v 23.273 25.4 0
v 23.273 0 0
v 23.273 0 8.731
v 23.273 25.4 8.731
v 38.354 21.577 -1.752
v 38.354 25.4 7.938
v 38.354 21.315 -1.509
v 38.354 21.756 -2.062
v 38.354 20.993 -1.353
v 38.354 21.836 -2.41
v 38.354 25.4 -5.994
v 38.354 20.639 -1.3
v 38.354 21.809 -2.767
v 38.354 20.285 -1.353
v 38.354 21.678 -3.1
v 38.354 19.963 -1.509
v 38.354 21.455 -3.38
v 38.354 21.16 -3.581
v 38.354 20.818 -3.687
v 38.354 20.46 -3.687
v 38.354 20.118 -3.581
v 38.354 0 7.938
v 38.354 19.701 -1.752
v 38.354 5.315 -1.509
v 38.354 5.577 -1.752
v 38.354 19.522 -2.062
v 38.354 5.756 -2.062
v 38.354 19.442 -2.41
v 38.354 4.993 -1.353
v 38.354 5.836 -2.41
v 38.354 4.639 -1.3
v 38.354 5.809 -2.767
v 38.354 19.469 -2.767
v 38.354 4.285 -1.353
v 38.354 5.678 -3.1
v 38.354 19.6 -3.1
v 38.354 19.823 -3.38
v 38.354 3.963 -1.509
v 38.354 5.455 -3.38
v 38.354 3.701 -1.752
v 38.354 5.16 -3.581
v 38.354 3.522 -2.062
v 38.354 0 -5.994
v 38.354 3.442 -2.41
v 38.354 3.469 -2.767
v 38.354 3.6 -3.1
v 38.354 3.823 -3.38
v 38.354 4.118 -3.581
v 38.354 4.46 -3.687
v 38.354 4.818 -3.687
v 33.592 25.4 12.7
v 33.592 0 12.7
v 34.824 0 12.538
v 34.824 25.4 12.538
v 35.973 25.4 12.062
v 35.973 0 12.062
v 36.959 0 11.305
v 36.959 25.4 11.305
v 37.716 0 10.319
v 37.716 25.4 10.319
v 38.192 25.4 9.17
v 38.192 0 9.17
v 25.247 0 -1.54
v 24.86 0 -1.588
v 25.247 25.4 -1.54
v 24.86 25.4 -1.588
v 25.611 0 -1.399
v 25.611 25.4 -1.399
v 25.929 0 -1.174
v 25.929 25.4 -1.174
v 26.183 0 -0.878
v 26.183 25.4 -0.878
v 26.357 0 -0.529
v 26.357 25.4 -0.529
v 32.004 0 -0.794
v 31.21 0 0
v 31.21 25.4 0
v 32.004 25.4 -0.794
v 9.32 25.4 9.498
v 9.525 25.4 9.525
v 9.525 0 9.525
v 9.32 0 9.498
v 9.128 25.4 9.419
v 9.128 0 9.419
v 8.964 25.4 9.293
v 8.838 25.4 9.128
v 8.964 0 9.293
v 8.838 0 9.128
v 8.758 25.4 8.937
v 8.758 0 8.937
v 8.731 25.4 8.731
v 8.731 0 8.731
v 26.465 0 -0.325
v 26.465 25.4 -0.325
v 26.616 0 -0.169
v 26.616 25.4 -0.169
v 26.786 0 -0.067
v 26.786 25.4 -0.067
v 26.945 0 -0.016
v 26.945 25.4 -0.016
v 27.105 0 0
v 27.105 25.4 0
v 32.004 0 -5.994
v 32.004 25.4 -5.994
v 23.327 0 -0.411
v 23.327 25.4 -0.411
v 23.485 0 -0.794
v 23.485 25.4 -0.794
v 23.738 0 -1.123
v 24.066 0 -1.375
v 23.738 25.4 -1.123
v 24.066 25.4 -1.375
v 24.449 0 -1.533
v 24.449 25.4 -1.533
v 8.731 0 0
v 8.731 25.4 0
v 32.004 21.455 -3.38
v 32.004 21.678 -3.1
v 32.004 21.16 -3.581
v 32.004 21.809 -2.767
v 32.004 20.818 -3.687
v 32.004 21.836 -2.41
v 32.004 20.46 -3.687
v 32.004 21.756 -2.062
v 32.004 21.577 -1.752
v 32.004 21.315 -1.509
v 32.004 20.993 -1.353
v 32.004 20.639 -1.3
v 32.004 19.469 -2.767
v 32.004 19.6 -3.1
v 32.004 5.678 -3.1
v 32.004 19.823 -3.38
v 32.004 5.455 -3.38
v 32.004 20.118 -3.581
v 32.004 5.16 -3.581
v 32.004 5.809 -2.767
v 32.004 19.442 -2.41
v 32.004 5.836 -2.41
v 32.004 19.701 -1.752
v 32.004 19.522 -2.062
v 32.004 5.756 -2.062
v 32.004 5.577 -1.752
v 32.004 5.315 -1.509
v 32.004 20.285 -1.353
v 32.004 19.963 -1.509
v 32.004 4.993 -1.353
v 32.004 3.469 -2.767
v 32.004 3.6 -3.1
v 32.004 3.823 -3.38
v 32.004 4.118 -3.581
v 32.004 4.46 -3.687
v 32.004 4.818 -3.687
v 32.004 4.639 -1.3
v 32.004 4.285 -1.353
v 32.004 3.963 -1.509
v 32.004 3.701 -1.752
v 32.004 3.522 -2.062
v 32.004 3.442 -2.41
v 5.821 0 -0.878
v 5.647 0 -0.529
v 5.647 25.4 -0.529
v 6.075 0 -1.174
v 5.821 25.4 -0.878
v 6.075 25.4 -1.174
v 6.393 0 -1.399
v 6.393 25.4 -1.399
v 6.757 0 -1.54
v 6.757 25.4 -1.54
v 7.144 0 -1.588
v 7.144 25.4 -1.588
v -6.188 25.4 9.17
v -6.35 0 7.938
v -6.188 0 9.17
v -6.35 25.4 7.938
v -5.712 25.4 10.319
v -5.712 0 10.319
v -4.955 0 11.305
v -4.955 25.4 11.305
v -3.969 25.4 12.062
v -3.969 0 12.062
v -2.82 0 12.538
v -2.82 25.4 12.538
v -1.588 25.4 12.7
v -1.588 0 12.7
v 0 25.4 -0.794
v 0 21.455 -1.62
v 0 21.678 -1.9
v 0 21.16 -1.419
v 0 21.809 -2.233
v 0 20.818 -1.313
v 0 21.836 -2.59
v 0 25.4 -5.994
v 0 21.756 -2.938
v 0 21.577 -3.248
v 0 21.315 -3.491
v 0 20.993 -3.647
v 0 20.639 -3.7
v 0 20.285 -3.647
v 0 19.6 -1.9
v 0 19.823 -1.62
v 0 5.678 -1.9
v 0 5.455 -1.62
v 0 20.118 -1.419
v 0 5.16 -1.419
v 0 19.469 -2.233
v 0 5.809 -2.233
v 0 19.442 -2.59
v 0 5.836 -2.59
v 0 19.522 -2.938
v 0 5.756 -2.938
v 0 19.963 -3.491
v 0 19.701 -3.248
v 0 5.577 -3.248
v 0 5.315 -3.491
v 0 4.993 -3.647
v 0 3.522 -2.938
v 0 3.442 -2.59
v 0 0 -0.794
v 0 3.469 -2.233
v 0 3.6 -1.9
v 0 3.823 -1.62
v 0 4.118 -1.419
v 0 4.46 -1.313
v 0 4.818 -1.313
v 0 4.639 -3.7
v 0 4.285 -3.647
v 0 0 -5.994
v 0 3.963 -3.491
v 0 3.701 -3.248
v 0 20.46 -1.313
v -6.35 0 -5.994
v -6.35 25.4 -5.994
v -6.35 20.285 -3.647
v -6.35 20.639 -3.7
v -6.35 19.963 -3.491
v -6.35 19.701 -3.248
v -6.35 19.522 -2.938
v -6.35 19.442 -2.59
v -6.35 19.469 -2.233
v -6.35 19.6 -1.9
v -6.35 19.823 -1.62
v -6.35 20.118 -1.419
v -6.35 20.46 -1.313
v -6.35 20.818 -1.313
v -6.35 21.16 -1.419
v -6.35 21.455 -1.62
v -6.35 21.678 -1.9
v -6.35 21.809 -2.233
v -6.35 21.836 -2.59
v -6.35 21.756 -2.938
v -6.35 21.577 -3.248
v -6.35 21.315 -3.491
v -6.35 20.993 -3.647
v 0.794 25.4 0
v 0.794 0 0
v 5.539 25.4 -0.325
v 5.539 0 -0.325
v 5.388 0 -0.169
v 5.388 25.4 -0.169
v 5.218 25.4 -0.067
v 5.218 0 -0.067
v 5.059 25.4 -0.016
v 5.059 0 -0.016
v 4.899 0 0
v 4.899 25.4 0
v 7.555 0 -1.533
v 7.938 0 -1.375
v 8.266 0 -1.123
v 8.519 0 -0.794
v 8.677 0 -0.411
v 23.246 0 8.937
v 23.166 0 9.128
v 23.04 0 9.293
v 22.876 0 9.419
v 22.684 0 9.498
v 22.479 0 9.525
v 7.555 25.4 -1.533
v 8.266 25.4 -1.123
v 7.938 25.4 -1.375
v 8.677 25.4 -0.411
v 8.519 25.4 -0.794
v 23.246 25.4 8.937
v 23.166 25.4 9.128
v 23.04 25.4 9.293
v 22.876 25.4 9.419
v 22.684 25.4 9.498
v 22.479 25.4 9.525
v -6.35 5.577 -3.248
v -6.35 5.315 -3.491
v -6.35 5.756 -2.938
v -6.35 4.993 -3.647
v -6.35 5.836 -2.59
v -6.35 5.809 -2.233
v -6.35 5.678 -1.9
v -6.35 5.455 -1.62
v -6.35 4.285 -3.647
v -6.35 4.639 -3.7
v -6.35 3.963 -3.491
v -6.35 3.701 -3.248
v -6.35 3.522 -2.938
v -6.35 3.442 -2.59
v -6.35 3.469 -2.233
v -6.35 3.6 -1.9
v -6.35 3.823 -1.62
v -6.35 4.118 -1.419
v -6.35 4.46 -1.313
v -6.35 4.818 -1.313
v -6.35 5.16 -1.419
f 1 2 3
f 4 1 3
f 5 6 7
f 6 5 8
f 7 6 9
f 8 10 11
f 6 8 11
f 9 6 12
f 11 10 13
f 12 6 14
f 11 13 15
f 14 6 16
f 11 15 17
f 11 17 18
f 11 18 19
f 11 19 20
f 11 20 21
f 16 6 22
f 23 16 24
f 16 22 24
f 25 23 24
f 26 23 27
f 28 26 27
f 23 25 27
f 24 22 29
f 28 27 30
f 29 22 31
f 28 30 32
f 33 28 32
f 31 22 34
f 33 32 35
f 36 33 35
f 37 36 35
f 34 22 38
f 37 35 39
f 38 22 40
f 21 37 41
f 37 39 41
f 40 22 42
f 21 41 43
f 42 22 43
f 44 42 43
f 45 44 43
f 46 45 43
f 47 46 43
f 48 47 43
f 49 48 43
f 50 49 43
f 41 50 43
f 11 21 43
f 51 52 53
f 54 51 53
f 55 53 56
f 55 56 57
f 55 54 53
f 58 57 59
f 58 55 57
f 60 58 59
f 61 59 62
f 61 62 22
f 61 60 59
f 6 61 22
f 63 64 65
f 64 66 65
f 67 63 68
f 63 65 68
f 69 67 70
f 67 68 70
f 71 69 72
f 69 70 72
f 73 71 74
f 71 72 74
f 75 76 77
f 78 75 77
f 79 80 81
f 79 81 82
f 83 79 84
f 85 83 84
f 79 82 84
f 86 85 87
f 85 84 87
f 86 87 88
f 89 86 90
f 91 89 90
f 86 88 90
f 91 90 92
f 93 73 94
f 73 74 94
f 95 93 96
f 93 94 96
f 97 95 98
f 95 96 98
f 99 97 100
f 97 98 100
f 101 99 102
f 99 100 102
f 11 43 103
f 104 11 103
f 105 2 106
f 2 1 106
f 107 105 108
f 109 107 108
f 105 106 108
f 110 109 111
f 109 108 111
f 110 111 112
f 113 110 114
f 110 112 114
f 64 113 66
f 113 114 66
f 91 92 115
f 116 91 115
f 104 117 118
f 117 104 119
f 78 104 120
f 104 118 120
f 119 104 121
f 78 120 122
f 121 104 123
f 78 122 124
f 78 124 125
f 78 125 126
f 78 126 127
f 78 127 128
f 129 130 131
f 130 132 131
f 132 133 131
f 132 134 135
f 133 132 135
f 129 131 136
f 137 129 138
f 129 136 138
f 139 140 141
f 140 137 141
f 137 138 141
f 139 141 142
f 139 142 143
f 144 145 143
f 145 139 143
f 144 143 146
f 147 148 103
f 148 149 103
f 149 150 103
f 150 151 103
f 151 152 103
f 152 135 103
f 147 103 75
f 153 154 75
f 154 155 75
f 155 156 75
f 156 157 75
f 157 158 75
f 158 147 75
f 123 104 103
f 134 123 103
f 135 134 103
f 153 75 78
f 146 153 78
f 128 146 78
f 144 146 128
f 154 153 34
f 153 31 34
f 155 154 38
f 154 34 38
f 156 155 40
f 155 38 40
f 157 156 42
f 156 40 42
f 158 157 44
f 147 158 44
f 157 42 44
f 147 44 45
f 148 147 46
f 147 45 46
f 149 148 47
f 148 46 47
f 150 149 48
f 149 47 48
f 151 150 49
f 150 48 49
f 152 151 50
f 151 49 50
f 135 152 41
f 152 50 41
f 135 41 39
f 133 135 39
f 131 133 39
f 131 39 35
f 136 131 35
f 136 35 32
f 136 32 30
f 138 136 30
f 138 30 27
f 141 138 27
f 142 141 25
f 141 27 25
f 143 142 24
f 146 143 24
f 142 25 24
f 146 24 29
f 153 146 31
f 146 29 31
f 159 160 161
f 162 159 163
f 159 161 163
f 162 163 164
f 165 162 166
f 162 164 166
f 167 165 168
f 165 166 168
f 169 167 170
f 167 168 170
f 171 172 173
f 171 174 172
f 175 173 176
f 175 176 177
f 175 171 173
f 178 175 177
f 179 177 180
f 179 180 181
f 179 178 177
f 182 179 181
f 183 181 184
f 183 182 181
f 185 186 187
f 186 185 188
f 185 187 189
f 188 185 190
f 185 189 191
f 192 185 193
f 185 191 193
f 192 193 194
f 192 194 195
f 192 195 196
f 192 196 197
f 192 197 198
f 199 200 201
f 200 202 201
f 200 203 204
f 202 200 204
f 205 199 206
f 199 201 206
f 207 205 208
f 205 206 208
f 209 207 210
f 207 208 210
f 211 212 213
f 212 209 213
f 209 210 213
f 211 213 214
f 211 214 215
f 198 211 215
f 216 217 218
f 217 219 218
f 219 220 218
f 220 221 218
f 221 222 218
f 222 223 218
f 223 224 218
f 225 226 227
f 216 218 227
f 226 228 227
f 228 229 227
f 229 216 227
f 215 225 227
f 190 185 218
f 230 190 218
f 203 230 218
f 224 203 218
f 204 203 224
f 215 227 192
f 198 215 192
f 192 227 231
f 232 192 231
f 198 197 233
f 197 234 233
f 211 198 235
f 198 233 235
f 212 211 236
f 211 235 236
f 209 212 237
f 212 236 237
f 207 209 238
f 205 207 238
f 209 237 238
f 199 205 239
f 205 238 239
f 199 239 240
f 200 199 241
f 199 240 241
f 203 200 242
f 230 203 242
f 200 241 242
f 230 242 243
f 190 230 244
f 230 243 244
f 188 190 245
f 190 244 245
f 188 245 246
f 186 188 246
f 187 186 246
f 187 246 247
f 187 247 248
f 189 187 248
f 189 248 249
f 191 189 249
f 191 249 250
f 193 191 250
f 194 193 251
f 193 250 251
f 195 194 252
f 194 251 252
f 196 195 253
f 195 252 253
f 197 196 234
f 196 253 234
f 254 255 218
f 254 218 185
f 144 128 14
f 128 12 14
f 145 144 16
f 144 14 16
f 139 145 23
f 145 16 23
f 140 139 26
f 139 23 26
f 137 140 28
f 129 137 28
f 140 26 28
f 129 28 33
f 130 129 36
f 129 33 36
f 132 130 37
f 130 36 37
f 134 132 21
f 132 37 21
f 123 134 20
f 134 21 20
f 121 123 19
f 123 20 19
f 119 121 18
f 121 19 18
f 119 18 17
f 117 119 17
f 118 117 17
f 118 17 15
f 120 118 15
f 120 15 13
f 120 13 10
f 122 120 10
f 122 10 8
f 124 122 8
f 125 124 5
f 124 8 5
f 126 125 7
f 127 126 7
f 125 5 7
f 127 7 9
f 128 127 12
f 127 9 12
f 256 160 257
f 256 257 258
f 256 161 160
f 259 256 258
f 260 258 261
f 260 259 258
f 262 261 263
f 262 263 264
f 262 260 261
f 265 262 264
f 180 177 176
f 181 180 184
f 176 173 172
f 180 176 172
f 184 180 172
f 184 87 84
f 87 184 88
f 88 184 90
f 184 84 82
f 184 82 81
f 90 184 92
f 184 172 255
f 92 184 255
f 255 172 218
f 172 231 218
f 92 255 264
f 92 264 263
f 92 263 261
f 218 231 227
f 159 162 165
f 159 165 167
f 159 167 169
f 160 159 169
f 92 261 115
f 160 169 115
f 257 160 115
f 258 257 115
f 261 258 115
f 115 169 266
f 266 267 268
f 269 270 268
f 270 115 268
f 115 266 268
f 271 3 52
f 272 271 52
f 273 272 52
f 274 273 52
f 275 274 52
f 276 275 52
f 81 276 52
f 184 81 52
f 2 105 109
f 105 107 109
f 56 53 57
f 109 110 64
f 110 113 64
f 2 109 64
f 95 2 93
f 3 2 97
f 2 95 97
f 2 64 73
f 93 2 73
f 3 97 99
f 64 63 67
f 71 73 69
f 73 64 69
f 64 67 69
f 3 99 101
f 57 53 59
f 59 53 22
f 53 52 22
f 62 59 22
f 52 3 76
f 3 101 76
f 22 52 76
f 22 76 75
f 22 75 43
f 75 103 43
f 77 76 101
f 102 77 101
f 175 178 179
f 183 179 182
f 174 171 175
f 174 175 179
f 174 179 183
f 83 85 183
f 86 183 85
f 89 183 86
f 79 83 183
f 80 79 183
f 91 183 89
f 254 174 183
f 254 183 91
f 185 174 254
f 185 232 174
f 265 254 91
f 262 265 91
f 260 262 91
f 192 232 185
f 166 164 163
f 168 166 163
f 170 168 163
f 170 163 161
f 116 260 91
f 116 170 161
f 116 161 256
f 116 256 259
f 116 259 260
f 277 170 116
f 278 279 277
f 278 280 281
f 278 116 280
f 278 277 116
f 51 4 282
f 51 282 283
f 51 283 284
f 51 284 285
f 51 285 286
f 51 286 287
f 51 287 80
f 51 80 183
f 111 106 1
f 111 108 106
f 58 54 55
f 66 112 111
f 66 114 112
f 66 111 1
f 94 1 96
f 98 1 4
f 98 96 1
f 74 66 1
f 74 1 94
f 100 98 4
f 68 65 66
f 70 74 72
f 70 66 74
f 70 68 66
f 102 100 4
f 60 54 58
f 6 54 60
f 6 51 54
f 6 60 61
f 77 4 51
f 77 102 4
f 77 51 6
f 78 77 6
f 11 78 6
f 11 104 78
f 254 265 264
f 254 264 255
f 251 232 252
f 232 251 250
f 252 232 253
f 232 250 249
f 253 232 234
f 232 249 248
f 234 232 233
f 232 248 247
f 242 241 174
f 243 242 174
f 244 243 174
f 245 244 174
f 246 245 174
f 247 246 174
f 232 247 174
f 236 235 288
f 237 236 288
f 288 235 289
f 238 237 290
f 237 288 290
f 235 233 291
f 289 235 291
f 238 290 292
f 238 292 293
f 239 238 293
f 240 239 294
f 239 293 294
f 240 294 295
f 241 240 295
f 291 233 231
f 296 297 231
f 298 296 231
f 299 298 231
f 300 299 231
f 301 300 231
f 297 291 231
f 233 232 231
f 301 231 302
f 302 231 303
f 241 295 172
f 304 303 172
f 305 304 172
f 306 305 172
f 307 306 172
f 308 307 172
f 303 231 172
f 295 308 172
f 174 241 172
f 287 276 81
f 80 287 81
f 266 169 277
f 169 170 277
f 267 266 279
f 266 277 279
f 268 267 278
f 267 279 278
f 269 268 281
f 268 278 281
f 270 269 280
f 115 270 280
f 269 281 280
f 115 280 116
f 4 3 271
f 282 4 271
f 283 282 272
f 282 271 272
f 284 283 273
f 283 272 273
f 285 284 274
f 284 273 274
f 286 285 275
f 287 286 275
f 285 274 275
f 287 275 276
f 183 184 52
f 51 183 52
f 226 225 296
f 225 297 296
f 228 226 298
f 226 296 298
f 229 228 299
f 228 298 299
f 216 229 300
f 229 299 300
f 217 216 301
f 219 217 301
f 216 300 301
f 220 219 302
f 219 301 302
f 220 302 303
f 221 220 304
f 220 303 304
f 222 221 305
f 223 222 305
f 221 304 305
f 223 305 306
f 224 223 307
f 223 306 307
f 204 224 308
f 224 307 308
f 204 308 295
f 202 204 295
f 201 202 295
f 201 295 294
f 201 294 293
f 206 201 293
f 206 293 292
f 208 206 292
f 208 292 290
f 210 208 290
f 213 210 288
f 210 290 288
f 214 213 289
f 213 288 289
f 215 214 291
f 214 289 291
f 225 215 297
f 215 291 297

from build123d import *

# Parameters (mm, degrees)
BOSS_EXTRUDE1_DEPTH           = 25.4
CHAMFER1_SIZE                 = 0.79375
SKETCH4_W                     = 1.2
SKETCH4_H                     = 6.35
M2_CLEARANCE_HOLE1_AT_2_COUNT = 2
M2_CLEARANCE_HOLE1_AT_2_PITCH = 16
FILLET1_R                     = 4.7625
FILLET5_R                     = 1.5875
FILLET6_R                     = 1.5875
FILLET7_R                     = 0.79375
SKETCH6_W                     = 1.2
SKETCH6_H                     = 6.35
M2_CLEARANCE_HOLE2_AT_2_COUNT = 2
M2_CLEARANCE_HOLE2_AT_2_PITCH = 16


with BuildPart() as part:
    # Sketch1 → Boss-Extrude1 (new body)
    with BuildSketch(Plane(origin=(0, 0, 0), x_dir=(1, 0, 0), z_dir=(0, 1, 0))):
        with BuildLine():
            Line((0, 0), (0, 5.9944))
            Line((0, 5.9944), (-6.35, 5.9944))
            Line((-6.35, 5.9944), (-6.35, -12.7))
            Line((-6.35, -12.7), (38.354, -12.7))
            Line((38.354, -12.7), (38.354, 5.9944))
            Line((38.354, 5.9944), (32.004, 5.9944))
            Line((32.004, 5.9944), (32.004, 0))
            Line((32.004, 0), (26.44775, 0))
            Line((26.44775, 0), (26.44775, 1.5875))
            Line((26.44775, 1.5875), (23.27275, 1.5875))
            Line((23.27275, 1.5875), (23.27275, -8.73125))
            ThreePointArc((23.27275, -8.73125), (23.040266008, -9.292516008), (22.479, -9.525))
            Line((22.479, -9.525), (9.525, -9.525))
            ThreePointArc((9.525, -9.525), (8.963733992, -9.292516008), (8.73125, -8.73125))
            Line((8.73125, -8.73125), (8.73125, 1.5875))
            Line((8.73125, 1.5875), (5.55625, 1.5875))
            Line((5.55625, 1.5875), (5.55625, 0))
            Line((5.55625, 0), (0, 0))
        make_face()
    extrude(amount=BOSS_EXTRUDE1_DEPTH)

    # Chamfer1
    chamfer1_edges = [part.edges().sort_by_distance(p)[0] for p in [
        (0, 12.7, 0),
        (32.004, 12.7, 0),
    ]]
    chamfer(chamfer1_edges, length=CHAMFER1_SIZE)

    # Sketch4 → M2 Clearance Hole1 (revolve, cut)
    with BuildSketch(Plane(origin=(0, 20.6390625, -2.5), x_dir=(0, 0, -1), z_dir=(0, 1, 0))):
        with Locations((0.6, 3.175)):
            Rectangle(SKETCH4_W, SKETCH4_H)
    m2_clearance_hole1 = revolve(axis=Axis((6.35, 20.6390625, -2.5), (-1, 0, 0)), mode=Mode.SUBTRACT)

    # M2 Clearance Hole1 at 2: M2 Clearance Hole1 ×2
    with Locations(*[(0, -i * M2_CLEARANCE_HOLE1_AT_2_PITCH, 0) for i in range(1, M2_CLEARANCE_HOLE1_AT_2_COUNT)]):
        add(m2_clearance_hole1, mode=Mode.SUBTRACT)

    # Fillet1
    fillet1_edges = [part.edges().sort_by_distance(p)[0] for p in [
        (-6.35, 12.7, 12.7),
        (38.354, 12.7, 12.7),
    ]]
    fillet(fillet1_edges, radius=FILLET1_R)

    # Fillet5
    fillet5_edges = [part.edges().sort_by_distance(p)[0] for p in [
        (5.55625, 12.7, -1.5875),
        (8.73125, 12.7, -1.5875),
    ]]
    fillet(fillet5_edges, radius=FILLET5_R - 0.0001)  # a hair under: the kernel refuses the full size

    # Fillet6
    fillet6_edges = [part.edges().sort_by_distance(p)[0] for p in [
        (23.27275, 12.7, -1.5875),
        (26.44775, 12.7, -1.5875),
    ]]
    fillet(fillet6_edges, radius=FILLET6_R - 0.0001)  # a hair under: the kernel refuses the full size

    # Fillet7
    fillet7_edges = [part.edges().sort_by_distance(p)[0] for p in [
        (5.55625, 12.7, 0),
        (26.44775, 12.7, 0),
    ]]
    fillet(fillet7_edges, radius=FILLET7_R)

    # Sketch6 → M2 Clearance Hole2 (revolve, cut)
    with BuildSketch(Plane(origin=(32.004, 4.6390625, -2.5), x_dir=(0, 0, 1), z_dir=(0, 1, 0))):
        with Locations((0.6, 3.175)):
            Rectangle(SKETCH6_W, SKETCH6_H)
    m2_clearance_hole2 = revolve(axis=Axis((25.654, 4.6390625, -2.5), (1, 0, 0)), mode=Mode.SUBTRACT)

    # M2 Clearance Hole2 at 2: M2 Clearance Hole2 ×2
    with Locations(*[(0, i * M2_CLEARANCE_HOLE2_AT_2_PITCH, 0) for i in range(1, M2_CLEARANCE_HOLE2_AT_2_COUNT)]):
        add(m2_clearance_hole2, mode=Mode.SUBTRACT)


solid = part.part
